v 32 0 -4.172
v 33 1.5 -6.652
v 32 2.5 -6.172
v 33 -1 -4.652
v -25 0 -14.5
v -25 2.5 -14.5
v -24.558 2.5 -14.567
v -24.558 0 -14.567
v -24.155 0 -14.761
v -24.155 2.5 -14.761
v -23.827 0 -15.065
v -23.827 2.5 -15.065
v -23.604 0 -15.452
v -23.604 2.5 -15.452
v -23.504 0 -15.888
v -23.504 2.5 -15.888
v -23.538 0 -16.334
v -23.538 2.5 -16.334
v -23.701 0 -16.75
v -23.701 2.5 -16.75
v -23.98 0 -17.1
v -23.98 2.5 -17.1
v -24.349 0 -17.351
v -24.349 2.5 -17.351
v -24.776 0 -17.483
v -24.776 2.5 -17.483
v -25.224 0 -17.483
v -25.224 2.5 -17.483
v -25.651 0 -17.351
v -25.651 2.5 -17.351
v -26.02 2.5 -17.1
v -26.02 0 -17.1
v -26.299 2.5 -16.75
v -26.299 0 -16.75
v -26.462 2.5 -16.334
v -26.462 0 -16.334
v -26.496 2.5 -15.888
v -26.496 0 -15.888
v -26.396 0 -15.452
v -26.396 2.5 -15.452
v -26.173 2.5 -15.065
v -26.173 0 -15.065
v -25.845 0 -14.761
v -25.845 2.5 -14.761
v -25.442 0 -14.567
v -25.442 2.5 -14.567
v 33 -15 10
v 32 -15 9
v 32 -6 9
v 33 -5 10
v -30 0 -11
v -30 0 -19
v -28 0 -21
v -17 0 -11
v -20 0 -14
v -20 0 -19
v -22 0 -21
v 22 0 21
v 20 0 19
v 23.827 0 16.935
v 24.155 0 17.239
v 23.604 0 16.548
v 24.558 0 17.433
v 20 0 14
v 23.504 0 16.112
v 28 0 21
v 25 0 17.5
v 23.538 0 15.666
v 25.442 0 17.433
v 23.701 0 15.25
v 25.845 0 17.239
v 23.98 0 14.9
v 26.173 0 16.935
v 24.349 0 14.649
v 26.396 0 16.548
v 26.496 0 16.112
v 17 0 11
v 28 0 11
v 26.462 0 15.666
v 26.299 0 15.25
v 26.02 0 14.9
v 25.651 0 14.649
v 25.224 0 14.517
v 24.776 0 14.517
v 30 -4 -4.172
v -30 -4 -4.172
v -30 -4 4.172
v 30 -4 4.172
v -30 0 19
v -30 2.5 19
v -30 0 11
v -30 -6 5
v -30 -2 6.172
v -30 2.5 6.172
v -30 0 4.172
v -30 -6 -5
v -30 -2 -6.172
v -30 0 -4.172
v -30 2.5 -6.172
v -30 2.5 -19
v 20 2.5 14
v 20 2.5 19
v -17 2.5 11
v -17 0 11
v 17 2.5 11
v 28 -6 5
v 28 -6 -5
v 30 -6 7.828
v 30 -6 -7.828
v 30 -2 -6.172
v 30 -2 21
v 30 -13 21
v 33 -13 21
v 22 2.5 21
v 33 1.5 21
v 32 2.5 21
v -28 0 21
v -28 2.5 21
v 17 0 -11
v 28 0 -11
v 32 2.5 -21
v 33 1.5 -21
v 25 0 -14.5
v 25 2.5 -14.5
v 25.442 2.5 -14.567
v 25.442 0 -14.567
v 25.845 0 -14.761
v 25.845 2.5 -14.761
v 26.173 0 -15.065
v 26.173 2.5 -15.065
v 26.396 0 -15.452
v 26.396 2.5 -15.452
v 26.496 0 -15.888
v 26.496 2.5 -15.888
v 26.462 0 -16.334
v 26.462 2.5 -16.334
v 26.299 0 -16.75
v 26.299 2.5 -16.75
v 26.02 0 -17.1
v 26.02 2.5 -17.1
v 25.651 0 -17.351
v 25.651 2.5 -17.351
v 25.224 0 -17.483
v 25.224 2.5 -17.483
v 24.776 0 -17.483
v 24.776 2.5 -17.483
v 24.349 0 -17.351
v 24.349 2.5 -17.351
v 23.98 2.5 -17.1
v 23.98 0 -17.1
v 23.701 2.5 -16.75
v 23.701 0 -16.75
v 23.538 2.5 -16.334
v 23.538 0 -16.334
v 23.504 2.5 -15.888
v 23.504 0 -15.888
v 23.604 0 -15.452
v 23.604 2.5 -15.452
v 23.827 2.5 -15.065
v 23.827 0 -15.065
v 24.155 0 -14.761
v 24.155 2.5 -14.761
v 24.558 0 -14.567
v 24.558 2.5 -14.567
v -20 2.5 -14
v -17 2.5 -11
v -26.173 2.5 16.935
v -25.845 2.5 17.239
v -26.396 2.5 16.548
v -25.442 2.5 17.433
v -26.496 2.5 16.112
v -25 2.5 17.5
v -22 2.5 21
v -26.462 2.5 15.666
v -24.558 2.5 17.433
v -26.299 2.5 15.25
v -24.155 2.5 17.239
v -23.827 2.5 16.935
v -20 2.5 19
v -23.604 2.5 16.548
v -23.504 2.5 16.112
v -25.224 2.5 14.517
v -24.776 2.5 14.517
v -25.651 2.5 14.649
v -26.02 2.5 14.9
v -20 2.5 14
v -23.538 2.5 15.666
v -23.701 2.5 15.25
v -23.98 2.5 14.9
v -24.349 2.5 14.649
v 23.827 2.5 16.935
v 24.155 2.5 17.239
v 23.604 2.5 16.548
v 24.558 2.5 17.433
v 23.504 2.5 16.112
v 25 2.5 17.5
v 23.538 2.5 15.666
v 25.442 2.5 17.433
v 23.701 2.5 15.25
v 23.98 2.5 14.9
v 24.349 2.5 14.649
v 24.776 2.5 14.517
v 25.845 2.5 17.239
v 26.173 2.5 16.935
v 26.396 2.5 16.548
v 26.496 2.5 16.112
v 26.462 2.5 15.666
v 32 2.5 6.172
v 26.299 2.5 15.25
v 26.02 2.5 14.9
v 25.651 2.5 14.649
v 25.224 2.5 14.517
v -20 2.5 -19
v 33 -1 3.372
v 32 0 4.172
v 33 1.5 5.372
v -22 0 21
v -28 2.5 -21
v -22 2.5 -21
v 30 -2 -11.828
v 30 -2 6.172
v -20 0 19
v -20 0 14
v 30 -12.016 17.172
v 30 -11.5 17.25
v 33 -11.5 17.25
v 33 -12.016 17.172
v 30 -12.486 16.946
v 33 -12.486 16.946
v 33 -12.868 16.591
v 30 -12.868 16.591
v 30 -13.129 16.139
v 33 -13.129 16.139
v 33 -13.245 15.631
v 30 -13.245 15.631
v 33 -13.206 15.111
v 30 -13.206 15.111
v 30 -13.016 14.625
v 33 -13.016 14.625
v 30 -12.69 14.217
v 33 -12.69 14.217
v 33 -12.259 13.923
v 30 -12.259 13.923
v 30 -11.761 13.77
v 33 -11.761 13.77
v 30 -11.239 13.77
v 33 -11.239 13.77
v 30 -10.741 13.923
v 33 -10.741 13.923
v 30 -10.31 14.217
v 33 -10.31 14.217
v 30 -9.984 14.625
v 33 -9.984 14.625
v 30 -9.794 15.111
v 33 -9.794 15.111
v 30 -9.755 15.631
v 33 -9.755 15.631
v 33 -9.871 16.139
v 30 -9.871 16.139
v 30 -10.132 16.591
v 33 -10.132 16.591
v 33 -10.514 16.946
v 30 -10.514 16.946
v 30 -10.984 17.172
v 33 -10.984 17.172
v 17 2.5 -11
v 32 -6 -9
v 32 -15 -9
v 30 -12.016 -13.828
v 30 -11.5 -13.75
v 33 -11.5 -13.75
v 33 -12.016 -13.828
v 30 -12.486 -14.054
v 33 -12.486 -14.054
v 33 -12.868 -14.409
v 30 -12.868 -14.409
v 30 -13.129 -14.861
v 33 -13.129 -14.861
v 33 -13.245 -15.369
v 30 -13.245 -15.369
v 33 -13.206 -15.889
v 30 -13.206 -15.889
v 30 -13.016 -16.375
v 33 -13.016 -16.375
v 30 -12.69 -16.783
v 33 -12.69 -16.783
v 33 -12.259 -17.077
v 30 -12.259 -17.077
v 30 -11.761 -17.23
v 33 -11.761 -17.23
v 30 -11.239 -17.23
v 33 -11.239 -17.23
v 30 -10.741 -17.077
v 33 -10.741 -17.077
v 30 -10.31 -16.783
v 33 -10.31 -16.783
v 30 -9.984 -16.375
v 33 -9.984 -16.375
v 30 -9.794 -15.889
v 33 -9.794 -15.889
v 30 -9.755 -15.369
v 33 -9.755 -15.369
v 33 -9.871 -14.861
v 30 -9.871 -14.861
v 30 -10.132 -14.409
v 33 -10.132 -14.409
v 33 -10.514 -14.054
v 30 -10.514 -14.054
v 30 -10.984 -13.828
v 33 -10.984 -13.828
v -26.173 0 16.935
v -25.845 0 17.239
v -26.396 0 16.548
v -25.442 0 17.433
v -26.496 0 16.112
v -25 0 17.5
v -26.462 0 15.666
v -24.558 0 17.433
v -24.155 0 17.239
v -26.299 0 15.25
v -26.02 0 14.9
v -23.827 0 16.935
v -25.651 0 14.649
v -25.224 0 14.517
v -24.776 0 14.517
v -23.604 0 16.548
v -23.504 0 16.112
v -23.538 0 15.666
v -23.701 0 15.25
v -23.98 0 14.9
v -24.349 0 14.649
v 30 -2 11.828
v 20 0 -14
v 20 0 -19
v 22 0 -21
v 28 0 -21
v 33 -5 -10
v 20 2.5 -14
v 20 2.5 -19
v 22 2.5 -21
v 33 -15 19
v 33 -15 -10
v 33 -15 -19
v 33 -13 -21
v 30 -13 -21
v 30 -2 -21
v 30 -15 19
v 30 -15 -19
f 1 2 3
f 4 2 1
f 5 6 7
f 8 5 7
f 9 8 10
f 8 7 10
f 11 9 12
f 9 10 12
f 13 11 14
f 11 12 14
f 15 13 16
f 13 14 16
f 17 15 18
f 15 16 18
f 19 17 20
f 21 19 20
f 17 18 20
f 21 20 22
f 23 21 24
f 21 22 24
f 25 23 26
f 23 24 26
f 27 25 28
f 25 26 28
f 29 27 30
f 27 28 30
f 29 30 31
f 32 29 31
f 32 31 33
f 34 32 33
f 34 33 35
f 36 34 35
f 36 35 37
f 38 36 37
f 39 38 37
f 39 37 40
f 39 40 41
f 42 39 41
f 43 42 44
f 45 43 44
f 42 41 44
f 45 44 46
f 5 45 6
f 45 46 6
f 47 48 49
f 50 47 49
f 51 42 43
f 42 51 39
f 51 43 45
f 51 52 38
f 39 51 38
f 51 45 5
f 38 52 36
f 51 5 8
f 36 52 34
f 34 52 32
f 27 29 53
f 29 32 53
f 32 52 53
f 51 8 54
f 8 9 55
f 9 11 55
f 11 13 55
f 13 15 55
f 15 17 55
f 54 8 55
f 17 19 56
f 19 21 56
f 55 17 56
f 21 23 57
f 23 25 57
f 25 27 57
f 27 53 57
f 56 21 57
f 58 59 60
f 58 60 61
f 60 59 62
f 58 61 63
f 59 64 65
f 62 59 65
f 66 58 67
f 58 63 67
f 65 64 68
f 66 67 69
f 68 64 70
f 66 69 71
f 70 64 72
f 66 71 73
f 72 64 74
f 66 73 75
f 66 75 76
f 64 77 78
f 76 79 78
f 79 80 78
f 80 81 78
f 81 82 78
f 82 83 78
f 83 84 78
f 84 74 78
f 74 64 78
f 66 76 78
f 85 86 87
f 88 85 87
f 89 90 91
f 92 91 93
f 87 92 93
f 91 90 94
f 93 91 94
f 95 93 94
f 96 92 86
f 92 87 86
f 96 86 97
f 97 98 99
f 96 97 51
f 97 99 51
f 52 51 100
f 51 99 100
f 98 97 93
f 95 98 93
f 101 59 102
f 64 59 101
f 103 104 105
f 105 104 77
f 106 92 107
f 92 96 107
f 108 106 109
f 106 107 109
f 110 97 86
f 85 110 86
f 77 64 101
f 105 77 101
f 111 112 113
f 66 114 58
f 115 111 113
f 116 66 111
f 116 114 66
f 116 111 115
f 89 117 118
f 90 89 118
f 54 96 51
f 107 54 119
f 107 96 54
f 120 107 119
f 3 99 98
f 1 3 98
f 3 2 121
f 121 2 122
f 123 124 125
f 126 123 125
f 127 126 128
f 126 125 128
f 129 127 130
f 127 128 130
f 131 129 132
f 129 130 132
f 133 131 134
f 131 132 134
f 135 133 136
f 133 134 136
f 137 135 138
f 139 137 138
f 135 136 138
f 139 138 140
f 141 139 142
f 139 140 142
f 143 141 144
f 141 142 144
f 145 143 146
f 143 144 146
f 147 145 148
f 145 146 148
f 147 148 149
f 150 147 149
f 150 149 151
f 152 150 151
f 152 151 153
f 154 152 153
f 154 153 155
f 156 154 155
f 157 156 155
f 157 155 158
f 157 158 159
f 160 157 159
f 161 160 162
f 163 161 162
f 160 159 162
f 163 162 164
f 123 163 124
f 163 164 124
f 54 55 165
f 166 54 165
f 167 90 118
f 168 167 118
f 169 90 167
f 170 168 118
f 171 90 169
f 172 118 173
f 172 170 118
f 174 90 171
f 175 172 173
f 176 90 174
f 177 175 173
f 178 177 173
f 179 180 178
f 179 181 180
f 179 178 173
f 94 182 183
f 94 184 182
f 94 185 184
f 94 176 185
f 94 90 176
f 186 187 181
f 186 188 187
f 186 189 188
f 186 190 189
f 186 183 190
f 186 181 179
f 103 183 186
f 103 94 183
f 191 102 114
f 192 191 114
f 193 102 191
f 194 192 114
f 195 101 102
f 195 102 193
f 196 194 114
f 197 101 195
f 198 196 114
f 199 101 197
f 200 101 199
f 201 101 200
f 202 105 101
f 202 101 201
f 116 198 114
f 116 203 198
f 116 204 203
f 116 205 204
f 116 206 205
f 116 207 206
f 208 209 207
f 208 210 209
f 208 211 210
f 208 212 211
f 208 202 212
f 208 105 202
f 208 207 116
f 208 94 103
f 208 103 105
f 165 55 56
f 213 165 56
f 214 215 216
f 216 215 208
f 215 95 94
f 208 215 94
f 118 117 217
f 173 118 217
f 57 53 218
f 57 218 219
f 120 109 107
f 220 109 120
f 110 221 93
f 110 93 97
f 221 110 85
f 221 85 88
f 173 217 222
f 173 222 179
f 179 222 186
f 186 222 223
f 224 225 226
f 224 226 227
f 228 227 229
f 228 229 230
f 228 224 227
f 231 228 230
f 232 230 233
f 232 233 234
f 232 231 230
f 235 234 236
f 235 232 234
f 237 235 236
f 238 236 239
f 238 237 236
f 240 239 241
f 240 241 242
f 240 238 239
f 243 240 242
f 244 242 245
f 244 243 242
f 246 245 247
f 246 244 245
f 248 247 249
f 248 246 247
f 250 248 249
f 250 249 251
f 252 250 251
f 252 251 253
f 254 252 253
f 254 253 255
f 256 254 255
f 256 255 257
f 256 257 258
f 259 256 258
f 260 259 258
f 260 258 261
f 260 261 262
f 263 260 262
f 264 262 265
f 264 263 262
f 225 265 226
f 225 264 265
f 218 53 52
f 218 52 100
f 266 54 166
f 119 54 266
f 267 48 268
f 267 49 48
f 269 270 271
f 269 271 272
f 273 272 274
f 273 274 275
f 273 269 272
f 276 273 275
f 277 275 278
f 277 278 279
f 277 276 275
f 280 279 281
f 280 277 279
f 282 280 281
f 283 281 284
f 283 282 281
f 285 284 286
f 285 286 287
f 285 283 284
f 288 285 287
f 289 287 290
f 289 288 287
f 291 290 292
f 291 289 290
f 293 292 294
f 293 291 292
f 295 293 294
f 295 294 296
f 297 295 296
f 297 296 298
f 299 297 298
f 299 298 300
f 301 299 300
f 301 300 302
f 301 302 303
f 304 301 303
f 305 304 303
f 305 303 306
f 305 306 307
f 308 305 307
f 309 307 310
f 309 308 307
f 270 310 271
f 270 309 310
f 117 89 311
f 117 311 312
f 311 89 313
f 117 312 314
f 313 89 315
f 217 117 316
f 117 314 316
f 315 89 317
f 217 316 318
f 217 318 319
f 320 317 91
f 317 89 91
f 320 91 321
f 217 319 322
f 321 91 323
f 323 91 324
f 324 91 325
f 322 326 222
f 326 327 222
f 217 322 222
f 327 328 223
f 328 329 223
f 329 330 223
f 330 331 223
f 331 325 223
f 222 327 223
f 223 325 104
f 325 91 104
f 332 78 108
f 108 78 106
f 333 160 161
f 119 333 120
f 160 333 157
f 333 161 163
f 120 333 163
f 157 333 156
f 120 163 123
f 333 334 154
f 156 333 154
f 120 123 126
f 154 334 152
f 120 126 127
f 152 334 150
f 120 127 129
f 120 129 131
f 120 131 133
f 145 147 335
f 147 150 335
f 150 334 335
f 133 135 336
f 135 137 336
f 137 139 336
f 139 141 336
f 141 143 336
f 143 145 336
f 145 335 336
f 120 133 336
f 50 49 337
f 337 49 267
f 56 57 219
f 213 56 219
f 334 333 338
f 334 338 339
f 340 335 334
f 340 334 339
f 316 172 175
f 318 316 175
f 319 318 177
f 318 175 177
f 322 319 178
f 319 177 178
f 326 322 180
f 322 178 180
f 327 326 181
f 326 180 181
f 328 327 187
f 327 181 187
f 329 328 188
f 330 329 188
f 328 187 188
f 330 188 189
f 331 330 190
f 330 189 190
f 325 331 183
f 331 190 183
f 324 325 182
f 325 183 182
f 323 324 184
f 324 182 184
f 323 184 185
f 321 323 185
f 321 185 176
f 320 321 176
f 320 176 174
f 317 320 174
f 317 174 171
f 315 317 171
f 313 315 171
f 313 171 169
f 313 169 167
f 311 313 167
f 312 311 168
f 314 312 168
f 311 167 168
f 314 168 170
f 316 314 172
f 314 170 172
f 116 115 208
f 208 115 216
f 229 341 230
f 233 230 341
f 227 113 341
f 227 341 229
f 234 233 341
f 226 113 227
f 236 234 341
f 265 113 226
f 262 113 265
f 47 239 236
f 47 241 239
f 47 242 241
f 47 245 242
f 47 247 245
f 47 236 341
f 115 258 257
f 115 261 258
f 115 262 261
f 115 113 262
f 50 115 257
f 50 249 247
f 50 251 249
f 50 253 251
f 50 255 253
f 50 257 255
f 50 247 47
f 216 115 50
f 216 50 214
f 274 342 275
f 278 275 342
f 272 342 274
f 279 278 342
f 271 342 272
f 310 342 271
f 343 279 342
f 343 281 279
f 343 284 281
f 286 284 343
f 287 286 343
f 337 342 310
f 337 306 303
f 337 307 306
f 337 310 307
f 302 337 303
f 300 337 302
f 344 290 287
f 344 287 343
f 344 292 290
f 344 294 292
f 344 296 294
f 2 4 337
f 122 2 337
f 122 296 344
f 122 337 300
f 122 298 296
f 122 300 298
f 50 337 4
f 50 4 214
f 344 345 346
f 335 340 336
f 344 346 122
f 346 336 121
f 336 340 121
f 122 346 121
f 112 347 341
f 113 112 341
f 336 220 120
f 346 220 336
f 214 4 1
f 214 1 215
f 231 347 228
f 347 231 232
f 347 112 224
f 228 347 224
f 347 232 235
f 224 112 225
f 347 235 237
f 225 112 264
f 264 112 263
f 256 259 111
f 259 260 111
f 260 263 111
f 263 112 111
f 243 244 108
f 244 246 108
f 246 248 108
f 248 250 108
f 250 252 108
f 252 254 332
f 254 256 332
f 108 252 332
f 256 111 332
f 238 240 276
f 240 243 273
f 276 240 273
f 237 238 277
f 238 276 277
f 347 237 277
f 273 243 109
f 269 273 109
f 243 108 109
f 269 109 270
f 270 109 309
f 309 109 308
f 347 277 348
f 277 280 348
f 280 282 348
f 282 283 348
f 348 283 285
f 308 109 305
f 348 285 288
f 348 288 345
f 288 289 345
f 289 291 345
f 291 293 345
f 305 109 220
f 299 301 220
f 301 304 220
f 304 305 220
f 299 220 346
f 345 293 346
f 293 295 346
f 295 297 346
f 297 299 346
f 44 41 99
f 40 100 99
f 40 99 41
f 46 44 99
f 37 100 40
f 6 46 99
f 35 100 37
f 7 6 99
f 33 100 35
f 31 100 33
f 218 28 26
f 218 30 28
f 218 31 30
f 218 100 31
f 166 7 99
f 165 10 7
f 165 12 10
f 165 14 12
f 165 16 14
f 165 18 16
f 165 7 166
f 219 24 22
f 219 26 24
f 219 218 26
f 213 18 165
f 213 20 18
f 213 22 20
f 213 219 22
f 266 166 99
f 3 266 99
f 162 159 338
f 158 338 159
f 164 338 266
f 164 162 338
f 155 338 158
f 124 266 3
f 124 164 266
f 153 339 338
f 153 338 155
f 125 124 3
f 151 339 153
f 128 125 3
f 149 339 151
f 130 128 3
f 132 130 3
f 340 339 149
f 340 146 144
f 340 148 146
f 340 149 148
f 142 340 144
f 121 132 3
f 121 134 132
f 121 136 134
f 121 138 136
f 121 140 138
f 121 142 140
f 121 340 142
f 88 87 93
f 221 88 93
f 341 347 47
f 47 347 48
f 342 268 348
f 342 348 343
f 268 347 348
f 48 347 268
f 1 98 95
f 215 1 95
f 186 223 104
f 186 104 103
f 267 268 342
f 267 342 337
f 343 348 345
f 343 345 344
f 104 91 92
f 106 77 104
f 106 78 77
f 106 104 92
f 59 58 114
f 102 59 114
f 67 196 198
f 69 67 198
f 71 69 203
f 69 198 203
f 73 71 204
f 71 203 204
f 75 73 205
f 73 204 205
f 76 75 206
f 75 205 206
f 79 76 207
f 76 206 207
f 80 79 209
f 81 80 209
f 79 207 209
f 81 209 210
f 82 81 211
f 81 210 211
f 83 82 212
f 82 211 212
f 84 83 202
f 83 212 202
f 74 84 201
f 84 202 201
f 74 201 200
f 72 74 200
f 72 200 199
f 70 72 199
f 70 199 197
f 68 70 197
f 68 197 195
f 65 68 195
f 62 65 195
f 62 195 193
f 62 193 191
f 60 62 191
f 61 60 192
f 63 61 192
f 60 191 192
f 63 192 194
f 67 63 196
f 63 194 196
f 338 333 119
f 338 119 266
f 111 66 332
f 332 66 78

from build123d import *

# Parameters (mm, degrees)
SKETCH_2_W          = 60
SKETCH_2_H          = 42
EXTRUDE_1_DEPTH     = 2.5
CUT_EXTRUDE_START   = 2.5
SKETCH_3_R          = 1.5
CUT_EXTRUDE_1_DEPTH = 2.5
SKETCH_6_W          = 40
SKETCH_6_H          = 10
CUT_EXTRUDE_2_DEPTH = 2.5
SKETCH_7_W          = 60
SKETCH_7_H          = 10
EXTRUDE_3_DEPTH     = 6
EXTRUDE_START       = 2.5
SKETCH_9_W          = 3
SKETCH_9_H          = 42
EXTRUDE_4_DEPTH     = 17.5
EXTRUDE_START_2     = 30
EXTRUDE_5_DEPTH     = 60
CUT_EXTRUDE_START_2 = 30
SKETCH_16_R         = 1.75
CUT_EXTRUDE_3_DEPTH = 3
CUT_EXTRUDE_START_3 = -30
CUT_EXTRUDE_4_DEPTH = 60
CHAMFER_1_SIZE      = 2
CUT_EXTRUDE_6_DEPTH = 63
CHAMFER_2_SIZE      = 2
CUT_EXTRUDE_START_4 = 33
SKETCH_21_W         = 20
SKETCH_21_H         = 10
CUT_EXTRUDE_7_DEPTH = 1
CHAMFER_3_SIZE      = 1
CHAMFER_4_SIZE      = 3


with BuildPart() as part:
    # 草图2 → 凸台-拉伸1 (new body)
    with BuildSketch(Plane(origin=(0, 0, 0), x_dir=(1, 0, 0), z_dir=(0, 1, 0))):
        Rectangle(SKETCH_2_W, SKETCH_2_H)
    extrude(amount=EXTRUDE_1_DEPTH)

    # 草图3 → 切除-拉伸1 (cut)
    with BuildSketch(Plane(origin=(0, 0, 0), x_dir=(1, 0, 0), z_dir=(0, 1, 0)).offset(CUT_EXTRUDE_START)):
        with Locations(Location((-25, 16, 0), (0, 0, 270))):
            Circle(SKETCH_3_R)
        with Locations(Location((25, 16, 0), (0, 0, 270))):
            Circle(SKETCH_3_R)
        with Locations(Location((-25, -16, 0), (0, 0, 270))):
            Circle(SKETCH_3_R)
        with Locations(Location((25, -16, 0), (0, 0, 270))):
            Circle(SKETCH_3_R)
    extrude(amount=-CUT_EXTRUDE_1_DEPTH, mode=Mode.SUBTRACT)

    # 草图6 → 切除-拉伸2 (cut)
    with BuildSketch(Plane(origin=(0, 0, 0), x_dir=(1, 0, 0), z_dir=(0, 1, 0))):
        with Locations((0, 16)):
            Rectangle(SKETCH_6_W, SKETCH_6_H)
        with Locations((0, -16)):
            Rectangle(SKETCH_6_W, SKETCH_6_H)
    extrude(amount=CUT_EXTRUDE_2_DEPTH, mode=Mode.SUBTRACT)

    # 草图7 → 凸台-拉伸3 (add)
    with BuildSketch(Plane(origin=(0, 0, 0), x_dir=(1, 0, 0), z_dir=(0, 1, 0))):
        Rectangle(SKETCH_7_W, SKETCH_7_H)
    extrude(amount=-EXTRUDE_3_DEPTH)

    # 草图9 → 凸台-拉伸4 (add)
    with BuildSketch(Plane(origin=(0, 0, 0), x_dir=(1, 0, 0), z_dir=(0, 1, 0)).offset(EXTRUDE_START)):
        with Locations((31.5, 0)):
            Rectangle(SKETCH_9_W, SKETCH_9_H)
    extrude(amount=-EXTRUDE_4_DEPTH)

    # 草图11 → 凸台-拉伸5 (add)
    with BuildSketch(Plane(origin=(0, 0, 0), x_dir=(0, 0, -1), z_dir=(1, 0, 0)).offset(EXTRUDE_START_2)):
        Polygon((5, -6), (11, 0), (5, 0), align=None)
        Polygon((-5, -6), (-5, 0), (-11, 0), align=None)
    extrude(amount=-EXTRUDE_5_DEPTH)

    # 草图16 → 切除-拉伸3 (cut)
    with BuildSketch(Plane(origin=(0, 0, 0), x_dir=(0, 0, -1), z_dir=(1, 0, 0)).offset(CUT_EXTRUDE_START_2)):
        with Locations(Location((-15.5, -11.5, 0), (0, 0, 180))):
            Circle(SKETCH_16_R)
        with Locations(Location((15.5, -11.5, 0), (0, 0, 180))):
            Circle(SKETCH_16_R)
    extrude(amount=CUT_EXTRUDE_3_DEPTH, mode=Mode.SUBTRACT)

    # 草图18 → 切除-拉伸4 (cut)
    with BuildSketch(Plane(origin=(0, 0, 0), x_dir=(0, 0, -1), z_dir=(1, 0, 0)).offset(CUT_EXTRUDE_START_3)):
        Polygon((6.171572875, -2), (4.171572875, -4), (-4.171572875, -4), (-6.171572875, -2), align=None)
    extrude(amount=CUT_EXTRUDE_4_DEPTH, mode=Mode.SUBTRACT)

    # 倒角1
    chamfer_1_edges = [part.edges().sort_by_distance(p)[0] for p in [
        (30, 0, -16),
        (30, -3, -8),
        (30, -3, 8),
        (30, 0, 16),
    ]]
    chamfer(chamfer_1_edges, length=CHAMFER_1_SIZE)

    # 草图19 → 切除-拉伸6 (cut)
    with BuildSketch(Plane(origin=(0, 0, 0), x_dir=(0, 0, -1), z_dir=(1, 0, 0)).offset(CUT_EXTRUDE_START_3)):
        Polygon((6.171572875, 2.5), (4.171572875, 0), (-4.171572875, 0), (-6.171572875, 2.5), align=None)
    extrude(amount=CUT_EXTRUDE_6_DEPTH, mode=Mode.SUBTRACT)

    # 倒角2
    chamfer_2_edges = [part.edges().sort_by_distance(p)[0] for p in [
        (20, 1.25, 21),
        (-20, 1.25, 21),
        (-20, 1.25, -21),
        (20, 1.25, -21),
        (-30, 1.25, 21),
        (-30, 1.25, -21),
        (31.5, -15, -21),
        (31.5, -15, 21),
    ]]
    chamfer(chamfer_2_edges, length=CHAMFER_2_SIZE)

    # 草图21 → 切除-拉伸7 (cut)
    with BuildSketch(Plane(origin=(0, 0, 0), x_dir=(0, 0, -1), z_dir=(1, 0, 0)).offset(CUT_EXTRUDE_START_4)):
        with Locations((0, -10)):
            Rectangle(SKETCH_21_W, SKETCH_21_H)
    extrude(amount=-CUT_EXTRUDE_7_DEPTH, mode=Mode.SUBTRACT)

    # 倒角3
    chamfer_3_edges = [part.edges().sort_by_distance(p)[0] for p in [
        (33, 2.5, 13.585786438),
        (33, 0, 0),
        (33, 1.25, -5.171572875),
        (33, 2.5, -13.585786438),
        (32, -10, -10),
        (32, -10, 10),
        (32, -5, 0),
    ]]
    chamfer(chamfer_3_edges, length=CHAMFER_3_SIZE - 0.0001)  # a hair under: the kernel refuses the full size

    # 倒角4
    chamfer_4_edges = [part.edges().sort_by_distance(p)[0] for p in [
        (-20, 1.25, 11),
        (20, 1.25, 11),
        (20, 1.25, -11),
        (-20, 1.25, -11),
    ]]
    chamfer(chamfer_4_edges, length=CHAMFER_4_SIZE)


solid = part.part
